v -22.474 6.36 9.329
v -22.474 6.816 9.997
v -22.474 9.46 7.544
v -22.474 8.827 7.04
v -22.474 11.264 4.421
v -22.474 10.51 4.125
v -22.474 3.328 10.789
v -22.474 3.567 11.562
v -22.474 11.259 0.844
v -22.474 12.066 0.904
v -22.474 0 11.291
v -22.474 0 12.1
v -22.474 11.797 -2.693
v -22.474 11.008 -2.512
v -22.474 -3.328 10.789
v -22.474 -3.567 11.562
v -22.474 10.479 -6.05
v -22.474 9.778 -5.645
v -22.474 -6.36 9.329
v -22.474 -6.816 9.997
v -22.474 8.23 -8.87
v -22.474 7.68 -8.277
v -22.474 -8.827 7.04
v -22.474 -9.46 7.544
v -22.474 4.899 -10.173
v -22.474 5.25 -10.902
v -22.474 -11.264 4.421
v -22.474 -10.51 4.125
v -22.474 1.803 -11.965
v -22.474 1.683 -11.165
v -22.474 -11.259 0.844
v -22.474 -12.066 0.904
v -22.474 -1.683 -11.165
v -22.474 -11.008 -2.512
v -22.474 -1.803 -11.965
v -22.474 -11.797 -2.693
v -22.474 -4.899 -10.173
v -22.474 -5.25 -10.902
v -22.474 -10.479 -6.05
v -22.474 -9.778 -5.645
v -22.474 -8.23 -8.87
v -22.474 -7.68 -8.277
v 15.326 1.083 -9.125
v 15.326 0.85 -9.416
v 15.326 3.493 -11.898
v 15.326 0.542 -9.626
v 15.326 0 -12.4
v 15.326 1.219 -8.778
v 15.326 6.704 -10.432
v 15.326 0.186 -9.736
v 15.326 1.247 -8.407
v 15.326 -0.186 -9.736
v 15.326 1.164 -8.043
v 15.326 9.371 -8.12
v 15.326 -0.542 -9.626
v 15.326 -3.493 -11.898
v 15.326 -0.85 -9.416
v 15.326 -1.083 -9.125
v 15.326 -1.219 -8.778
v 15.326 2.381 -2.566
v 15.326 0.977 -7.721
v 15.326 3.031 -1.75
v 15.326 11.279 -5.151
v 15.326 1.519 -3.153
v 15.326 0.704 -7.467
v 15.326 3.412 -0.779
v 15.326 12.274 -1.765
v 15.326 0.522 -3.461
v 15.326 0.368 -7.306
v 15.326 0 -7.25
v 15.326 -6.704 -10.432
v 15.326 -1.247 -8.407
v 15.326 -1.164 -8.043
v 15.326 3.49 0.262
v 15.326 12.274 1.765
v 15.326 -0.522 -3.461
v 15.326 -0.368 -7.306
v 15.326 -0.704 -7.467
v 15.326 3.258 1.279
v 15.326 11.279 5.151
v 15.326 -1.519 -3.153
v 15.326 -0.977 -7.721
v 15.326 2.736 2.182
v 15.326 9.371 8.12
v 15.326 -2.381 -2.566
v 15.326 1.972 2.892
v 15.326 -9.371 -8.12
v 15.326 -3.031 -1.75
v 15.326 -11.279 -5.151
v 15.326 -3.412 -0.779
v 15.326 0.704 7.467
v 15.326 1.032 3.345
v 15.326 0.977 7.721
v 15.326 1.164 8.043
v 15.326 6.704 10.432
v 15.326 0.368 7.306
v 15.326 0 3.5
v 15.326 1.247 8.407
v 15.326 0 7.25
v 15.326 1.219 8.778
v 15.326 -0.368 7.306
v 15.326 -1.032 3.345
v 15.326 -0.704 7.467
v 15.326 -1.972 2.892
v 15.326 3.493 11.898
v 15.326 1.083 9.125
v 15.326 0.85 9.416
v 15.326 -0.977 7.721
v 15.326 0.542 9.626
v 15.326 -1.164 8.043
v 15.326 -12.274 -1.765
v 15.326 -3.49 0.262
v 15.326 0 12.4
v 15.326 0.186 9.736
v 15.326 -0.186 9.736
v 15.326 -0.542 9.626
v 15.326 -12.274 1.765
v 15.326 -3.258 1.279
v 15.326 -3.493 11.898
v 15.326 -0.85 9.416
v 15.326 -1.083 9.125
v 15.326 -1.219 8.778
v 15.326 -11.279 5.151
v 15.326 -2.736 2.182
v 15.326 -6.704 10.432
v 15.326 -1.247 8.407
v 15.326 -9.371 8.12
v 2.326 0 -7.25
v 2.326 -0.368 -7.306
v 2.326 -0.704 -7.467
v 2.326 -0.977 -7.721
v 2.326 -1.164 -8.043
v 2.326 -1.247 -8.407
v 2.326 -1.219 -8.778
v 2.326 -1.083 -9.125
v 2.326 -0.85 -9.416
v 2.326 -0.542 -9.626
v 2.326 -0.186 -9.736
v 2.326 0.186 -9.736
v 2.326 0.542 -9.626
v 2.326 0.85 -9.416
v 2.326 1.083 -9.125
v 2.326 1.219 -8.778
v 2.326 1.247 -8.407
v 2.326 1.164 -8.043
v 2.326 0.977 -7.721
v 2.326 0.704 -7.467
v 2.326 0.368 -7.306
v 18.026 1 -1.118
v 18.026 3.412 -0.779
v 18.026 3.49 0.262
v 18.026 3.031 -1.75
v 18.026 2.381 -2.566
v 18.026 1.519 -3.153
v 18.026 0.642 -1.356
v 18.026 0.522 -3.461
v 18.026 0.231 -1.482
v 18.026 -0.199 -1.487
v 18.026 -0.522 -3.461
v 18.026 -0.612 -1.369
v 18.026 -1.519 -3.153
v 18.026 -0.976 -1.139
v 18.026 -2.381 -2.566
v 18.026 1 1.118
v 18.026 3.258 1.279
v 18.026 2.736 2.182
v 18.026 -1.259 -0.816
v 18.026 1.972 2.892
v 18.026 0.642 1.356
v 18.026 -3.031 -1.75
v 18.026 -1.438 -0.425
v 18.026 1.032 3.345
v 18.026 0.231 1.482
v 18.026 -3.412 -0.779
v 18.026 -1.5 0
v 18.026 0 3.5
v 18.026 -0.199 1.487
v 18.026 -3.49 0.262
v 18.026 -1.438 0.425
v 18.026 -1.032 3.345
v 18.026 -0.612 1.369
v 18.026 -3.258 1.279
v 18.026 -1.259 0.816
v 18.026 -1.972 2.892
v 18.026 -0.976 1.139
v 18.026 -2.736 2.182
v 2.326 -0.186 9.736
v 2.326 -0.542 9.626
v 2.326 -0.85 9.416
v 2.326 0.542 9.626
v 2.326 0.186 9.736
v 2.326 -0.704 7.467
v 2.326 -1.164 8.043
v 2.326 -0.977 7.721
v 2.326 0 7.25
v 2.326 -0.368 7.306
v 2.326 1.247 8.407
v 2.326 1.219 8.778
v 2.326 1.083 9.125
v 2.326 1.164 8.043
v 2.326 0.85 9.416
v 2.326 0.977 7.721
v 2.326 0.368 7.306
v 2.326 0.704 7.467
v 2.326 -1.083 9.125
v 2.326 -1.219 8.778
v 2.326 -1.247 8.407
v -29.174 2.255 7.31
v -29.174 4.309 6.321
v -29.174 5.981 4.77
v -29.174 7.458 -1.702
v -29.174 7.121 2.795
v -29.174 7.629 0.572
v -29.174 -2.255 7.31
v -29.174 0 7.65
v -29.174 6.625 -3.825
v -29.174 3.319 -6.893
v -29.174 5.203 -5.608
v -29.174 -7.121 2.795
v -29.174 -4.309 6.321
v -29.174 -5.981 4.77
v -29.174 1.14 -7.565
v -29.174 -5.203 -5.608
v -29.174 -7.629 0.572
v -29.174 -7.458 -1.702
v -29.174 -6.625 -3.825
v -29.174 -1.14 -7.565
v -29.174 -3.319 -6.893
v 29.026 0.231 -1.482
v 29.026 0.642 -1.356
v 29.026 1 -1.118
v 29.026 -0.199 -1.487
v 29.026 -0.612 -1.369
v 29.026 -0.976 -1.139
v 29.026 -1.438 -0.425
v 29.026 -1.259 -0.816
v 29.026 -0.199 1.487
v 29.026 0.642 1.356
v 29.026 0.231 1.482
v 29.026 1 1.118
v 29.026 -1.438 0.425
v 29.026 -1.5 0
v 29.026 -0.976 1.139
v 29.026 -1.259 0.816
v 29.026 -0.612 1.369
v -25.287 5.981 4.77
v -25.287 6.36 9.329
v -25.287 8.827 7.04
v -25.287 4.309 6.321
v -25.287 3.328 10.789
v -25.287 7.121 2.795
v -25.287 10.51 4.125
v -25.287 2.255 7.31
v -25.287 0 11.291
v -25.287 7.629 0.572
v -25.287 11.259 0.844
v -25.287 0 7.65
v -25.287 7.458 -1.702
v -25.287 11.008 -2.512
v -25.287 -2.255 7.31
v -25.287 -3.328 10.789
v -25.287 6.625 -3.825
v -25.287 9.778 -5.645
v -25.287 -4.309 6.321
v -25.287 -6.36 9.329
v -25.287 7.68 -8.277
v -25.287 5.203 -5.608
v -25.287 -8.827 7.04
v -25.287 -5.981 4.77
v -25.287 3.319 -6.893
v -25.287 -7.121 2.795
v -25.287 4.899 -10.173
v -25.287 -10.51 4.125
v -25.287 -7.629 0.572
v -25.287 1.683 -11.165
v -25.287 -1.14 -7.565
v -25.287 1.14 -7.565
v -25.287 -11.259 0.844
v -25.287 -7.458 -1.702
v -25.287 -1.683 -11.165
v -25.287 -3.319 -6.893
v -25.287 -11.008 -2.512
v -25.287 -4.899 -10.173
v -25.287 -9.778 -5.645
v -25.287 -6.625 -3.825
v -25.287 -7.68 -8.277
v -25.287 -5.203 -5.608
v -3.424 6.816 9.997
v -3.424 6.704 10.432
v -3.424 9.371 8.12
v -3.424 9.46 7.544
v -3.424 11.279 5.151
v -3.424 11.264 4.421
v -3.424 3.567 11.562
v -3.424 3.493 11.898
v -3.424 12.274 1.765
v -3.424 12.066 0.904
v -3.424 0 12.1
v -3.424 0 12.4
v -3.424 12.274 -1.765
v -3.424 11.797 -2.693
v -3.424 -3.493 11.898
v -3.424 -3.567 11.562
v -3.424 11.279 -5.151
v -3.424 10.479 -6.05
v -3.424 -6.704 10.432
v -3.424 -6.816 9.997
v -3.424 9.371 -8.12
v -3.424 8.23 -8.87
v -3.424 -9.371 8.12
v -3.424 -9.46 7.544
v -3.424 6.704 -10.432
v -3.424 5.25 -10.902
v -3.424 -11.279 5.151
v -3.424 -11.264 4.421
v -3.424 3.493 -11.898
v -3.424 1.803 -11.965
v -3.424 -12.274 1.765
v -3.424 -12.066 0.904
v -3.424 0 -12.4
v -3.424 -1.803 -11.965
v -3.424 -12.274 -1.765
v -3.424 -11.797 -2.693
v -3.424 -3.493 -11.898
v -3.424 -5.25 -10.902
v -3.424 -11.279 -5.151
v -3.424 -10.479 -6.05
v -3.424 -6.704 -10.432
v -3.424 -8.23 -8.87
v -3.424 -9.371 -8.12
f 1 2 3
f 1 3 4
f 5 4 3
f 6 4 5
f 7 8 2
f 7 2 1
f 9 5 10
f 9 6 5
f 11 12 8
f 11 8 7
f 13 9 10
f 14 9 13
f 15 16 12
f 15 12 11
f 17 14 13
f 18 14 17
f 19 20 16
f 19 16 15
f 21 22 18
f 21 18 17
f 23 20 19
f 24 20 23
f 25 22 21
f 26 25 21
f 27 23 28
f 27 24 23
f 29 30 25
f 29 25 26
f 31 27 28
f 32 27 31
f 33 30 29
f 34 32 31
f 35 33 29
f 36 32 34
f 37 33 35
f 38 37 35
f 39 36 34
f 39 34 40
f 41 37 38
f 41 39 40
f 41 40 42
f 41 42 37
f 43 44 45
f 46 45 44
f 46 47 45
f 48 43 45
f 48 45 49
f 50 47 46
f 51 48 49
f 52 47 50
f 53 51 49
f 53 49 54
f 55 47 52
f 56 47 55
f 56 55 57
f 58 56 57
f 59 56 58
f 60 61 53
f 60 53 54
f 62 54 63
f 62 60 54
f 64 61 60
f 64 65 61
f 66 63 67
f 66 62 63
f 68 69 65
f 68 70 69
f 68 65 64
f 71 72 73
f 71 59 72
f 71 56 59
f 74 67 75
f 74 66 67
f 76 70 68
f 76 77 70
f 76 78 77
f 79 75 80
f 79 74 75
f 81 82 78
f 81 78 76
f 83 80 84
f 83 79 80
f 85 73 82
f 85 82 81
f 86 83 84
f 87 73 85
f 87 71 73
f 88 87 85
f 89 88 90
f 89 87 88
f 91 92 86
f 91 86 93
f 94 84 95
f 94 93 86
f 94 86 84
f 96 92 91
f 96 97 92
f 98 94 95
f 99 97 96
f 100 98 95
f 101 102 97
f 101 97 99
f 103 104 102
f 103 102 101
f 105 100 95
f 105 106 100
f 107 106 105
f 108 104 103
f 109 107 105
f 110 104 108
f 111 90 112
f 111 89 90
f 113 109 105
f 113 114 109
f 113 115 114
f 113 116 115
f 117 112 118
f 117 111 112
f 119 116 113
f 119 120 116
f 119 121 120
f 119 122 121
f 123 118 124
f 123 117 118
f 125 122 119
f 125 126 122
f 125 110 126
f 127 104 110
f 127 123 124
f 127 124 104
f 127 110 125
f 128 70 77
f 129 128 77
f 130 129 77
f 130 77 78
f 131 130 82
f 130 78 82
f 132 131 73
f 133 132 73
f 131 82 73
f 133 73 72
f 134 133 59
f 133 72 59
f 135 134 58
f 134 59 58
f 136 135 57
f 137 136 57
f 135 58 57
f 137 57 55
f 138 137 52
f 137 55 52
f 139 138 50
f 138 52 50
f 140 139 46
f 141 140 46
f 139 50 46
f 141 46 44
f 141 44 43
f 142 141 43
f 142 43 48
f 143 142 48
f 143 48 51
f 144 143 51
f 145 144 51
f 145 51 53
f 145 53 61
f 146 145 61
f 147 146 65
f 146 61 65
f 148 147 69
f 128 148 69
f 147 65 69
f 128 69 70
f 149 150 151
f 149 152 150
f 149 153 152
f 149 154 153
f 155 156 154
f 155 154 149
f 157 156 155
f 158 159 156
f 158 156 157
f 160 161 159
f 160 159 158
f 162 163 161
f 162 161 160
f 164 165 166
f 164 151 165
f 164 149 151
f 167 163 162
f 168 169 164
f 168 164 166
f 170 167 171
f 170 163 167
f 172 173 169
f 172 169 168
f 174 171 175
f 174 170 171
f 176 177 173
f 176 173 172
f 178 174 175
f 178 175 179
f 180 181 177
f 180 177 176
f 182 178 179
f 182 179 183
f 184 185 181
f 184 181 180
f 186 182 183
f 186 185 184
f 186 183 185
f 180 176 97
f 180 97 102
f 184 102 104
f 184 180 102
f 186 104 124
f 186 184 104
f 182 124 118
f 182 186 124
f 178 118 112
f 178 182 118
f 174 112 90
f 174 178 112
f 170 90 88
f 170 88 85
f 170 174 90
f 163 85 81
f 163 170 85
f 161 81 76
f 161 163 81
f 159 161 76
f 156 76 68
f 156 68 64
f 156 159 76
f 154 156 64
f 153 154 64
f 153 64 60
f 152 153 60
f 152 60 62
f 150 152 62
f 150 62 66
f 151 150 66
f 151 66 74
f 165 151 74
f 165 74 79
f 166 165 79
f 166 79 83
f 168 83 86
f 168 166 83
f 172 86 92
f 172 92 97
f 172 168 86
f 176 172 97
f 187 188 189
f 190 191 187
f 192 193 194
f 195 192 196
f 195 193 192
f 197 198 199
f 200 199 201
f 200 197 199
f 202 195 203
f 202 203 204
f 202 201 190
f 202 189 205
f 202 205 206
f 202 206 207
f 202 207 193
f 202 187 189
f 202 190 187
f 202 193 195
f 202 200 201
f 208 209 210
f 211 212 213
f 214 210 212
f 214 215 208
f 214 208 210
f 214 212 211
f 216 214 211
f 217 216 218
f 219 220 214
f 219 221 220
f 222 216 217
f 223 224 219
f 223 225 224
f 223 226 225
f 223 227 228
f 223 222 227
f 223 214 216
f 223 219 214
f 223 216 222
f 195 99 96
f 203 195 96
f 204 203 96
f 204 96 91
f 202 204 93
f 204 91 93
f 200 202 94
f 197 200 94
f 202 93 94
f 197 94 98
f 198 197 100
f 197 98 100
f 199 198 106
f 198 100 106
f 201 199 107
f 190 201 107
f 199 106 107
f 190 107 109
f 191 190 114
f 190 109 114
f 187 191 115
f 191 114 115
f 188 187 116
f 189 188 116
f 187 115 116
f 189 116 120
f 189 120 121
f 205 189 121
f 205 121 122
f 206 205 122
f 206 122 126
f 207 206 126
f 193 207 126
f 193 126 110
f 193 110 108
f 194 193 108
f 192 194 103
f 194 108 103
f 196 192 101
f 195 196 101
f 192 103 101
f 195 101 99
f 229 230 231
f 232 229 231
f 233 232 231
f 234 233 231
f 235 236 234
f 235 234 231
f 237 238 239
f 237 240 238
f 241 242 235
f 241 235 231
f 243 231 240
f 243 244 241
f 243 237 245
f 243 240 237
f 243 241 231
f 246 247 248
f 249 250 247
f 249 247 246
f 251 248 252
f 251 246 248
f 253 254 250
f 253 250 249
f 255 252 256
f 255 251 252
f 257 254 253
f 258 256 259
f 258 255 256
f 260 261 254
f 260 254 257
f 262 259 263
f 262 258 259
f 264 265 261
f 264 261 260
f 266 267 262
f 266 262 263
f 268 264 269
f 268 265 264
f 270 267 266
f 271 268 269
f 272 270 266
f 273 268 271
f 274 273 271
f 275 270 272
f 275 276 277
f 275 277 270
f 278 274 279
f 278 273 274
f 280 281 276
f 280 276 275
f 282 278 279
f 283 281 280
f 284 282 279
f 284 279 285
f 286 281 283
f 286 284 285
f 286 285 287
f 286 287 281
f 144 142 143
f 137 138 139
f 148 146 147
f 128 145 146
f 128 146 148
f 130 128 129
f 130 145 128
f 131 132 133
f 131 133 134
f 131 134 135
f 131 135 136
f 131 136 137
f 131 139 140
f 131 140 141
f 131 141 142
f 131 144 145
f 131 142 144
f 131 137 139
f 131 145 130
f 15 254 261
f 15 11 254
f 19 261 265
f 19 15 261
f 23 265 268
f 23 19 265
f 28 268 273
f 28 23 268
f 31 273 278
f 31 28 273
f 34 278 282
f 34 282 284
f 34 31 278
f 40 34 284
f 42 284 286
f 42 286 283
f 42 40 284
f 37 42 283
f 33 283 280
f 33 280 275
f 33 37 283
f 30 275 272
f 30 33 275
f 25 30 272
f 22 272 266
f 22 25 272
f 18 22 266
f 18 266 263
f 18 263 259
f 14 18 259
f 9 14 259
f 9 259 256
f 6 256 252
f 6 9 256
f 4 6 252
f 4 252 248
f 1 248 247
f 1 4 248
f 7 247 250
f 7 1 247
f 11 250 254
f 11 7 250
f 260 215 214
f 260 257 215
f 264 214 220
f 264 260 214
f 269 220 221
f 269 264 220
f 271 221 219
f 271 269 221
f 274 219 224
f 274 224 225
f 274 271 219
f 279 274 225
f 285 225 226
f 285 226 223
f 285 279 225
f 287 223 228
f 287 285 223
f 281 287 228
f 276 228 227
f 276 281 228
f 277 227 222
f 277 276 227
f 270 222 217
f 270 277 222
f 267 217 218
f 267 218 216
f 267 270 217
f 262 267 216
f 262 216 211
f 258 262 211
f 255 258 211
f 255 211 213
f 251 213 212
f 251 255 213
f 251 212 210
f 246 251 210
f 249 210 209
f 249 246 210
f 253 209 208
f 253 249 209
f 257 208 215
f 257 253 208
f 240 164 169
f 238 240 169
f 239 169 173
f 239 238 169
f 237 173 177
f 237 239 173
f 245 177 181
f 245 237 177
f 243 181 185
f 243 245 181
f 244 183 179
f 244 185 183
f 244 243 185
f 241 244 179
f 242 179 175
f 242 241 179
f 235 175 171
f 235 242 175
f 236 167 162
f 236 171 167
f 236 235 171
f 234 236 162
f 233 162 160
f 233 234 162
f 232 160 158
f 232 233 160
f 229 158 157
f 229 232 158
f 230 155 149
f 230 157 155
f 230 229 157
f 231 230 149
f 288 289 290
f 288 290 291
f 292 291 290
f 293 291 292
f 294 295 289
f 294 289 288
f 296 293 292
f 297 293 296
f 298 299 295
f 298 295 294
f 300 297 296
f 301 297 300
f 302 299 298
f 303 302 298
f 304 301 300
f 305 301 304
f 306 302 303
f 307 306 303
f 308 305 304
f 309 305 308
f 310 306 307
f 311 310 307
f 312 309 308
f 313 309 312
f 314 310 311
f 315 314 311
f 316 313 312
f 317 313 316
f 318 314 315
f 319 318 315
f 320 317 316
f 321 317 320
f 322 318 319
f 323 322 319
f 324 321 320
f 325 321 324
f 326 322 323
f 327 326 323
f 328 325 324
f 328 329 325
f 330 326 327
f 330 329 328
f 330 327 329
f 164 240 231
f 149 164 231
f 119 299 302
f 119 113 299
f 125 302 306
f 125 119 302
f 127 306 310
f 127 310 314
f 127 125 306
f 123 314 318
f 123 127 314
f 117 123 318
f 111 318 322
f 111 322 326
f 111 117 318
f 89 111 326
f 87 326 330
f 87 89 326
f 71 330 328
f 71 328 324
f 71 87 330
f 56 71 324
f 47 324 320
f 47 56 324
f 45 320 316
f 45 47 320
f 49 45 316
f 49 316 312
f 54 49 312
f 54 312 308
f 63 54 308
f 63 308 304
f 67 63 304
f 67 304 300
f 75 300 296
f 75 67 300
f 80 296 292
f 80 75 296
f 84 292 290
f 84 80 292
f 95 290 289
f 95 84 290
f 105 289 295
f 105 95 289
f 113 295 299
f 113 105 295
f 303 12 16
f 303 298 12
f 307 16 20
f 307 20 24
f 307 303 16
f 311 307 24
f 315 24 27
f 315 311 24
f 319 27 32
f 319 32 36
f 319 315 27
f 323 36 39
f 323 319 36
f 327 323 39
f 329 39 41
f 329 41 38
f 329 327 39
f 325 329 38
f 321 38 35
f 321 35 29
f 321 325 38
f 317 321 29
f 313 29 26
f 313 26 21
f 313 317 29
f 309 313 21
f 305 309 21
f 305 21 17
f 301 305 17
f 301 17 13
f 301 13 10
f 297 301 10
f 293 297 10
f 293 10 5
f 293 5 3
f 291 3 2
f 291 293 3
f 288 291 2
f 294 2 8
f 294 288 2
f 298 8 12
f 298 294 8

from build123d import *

# Parameters (mm, degrees)
CUT_EXTRUDE_3_DEPTH = 11
SKETCH_3_R          = 1.25
CUT_EXTRUDE_4_DEPTH = 13


with BuildPart() as part:
    # 草图1 → 旋转1 (revolve)
    with BuildSketch(Plane.XY, mode=Mode.PRIVATE) as revolve_1_sk:
        Polygon((-29.173795435, 0), (-29.173795435, 7.650126796), (-25.287235841, 7.650126796), (-25.287235841, 11.290701606), (-22.473795435, 11.290701606), (-22.473795435, 12.1), (-3.423795435, 12.1), (-3.423795435, 12.4), (15.326204565, 12.4), (15.326204565, 3.5), (18.026204565, 3.5), (18.026204565, 1.5), (29.026204565, 1.5), (29.026204565, 0), align=None)
    revolve(revolve_1_sk.sketch.rotate(Axis((-38.029247675, 0, 0), (1, 0, 0)), 90), axis=Axis((-38.029247675, 0, 0), (1, 0, 0)))

    # 草图2 → 切除-拉伸3 (cut)
    with BuildSketch(Plane(origin=(29.026204565, 0, 0), x_dir=(0, 0, -1), z_dir=(1, 0, 0))):
        Polygon((-49.186248705, 1), (-1.118033989, 1), (1.118033989, 1), (49.186248705, 1), (49.186248705, 97.136429433), (-49.186248705, 97.136429433), align=None)
    extrude(amount=-CUT_EXTRUDE_3_DEPTH, mode=Mode.SUBTRACT)

    # 草图3 → 切除-拉伸4 (cut)
    with BuildSketch(Plane(origin=(15.326204565, 0, 0), x_dir=(0, 0, -1), z_dir=(1, 0, 0))):
        with Locations((-8.5, 0)):
            Circle(SKETCH_3_R)
        with Locations(Location((8.5, 0, 0), (0, 0, 180))):
            Circle(SKETCH_3_R)
    extrude(amount=-CUT_EXTRUDE_4_DEPTH, mode=Mode.SUBTRACT)


solid = part.part
